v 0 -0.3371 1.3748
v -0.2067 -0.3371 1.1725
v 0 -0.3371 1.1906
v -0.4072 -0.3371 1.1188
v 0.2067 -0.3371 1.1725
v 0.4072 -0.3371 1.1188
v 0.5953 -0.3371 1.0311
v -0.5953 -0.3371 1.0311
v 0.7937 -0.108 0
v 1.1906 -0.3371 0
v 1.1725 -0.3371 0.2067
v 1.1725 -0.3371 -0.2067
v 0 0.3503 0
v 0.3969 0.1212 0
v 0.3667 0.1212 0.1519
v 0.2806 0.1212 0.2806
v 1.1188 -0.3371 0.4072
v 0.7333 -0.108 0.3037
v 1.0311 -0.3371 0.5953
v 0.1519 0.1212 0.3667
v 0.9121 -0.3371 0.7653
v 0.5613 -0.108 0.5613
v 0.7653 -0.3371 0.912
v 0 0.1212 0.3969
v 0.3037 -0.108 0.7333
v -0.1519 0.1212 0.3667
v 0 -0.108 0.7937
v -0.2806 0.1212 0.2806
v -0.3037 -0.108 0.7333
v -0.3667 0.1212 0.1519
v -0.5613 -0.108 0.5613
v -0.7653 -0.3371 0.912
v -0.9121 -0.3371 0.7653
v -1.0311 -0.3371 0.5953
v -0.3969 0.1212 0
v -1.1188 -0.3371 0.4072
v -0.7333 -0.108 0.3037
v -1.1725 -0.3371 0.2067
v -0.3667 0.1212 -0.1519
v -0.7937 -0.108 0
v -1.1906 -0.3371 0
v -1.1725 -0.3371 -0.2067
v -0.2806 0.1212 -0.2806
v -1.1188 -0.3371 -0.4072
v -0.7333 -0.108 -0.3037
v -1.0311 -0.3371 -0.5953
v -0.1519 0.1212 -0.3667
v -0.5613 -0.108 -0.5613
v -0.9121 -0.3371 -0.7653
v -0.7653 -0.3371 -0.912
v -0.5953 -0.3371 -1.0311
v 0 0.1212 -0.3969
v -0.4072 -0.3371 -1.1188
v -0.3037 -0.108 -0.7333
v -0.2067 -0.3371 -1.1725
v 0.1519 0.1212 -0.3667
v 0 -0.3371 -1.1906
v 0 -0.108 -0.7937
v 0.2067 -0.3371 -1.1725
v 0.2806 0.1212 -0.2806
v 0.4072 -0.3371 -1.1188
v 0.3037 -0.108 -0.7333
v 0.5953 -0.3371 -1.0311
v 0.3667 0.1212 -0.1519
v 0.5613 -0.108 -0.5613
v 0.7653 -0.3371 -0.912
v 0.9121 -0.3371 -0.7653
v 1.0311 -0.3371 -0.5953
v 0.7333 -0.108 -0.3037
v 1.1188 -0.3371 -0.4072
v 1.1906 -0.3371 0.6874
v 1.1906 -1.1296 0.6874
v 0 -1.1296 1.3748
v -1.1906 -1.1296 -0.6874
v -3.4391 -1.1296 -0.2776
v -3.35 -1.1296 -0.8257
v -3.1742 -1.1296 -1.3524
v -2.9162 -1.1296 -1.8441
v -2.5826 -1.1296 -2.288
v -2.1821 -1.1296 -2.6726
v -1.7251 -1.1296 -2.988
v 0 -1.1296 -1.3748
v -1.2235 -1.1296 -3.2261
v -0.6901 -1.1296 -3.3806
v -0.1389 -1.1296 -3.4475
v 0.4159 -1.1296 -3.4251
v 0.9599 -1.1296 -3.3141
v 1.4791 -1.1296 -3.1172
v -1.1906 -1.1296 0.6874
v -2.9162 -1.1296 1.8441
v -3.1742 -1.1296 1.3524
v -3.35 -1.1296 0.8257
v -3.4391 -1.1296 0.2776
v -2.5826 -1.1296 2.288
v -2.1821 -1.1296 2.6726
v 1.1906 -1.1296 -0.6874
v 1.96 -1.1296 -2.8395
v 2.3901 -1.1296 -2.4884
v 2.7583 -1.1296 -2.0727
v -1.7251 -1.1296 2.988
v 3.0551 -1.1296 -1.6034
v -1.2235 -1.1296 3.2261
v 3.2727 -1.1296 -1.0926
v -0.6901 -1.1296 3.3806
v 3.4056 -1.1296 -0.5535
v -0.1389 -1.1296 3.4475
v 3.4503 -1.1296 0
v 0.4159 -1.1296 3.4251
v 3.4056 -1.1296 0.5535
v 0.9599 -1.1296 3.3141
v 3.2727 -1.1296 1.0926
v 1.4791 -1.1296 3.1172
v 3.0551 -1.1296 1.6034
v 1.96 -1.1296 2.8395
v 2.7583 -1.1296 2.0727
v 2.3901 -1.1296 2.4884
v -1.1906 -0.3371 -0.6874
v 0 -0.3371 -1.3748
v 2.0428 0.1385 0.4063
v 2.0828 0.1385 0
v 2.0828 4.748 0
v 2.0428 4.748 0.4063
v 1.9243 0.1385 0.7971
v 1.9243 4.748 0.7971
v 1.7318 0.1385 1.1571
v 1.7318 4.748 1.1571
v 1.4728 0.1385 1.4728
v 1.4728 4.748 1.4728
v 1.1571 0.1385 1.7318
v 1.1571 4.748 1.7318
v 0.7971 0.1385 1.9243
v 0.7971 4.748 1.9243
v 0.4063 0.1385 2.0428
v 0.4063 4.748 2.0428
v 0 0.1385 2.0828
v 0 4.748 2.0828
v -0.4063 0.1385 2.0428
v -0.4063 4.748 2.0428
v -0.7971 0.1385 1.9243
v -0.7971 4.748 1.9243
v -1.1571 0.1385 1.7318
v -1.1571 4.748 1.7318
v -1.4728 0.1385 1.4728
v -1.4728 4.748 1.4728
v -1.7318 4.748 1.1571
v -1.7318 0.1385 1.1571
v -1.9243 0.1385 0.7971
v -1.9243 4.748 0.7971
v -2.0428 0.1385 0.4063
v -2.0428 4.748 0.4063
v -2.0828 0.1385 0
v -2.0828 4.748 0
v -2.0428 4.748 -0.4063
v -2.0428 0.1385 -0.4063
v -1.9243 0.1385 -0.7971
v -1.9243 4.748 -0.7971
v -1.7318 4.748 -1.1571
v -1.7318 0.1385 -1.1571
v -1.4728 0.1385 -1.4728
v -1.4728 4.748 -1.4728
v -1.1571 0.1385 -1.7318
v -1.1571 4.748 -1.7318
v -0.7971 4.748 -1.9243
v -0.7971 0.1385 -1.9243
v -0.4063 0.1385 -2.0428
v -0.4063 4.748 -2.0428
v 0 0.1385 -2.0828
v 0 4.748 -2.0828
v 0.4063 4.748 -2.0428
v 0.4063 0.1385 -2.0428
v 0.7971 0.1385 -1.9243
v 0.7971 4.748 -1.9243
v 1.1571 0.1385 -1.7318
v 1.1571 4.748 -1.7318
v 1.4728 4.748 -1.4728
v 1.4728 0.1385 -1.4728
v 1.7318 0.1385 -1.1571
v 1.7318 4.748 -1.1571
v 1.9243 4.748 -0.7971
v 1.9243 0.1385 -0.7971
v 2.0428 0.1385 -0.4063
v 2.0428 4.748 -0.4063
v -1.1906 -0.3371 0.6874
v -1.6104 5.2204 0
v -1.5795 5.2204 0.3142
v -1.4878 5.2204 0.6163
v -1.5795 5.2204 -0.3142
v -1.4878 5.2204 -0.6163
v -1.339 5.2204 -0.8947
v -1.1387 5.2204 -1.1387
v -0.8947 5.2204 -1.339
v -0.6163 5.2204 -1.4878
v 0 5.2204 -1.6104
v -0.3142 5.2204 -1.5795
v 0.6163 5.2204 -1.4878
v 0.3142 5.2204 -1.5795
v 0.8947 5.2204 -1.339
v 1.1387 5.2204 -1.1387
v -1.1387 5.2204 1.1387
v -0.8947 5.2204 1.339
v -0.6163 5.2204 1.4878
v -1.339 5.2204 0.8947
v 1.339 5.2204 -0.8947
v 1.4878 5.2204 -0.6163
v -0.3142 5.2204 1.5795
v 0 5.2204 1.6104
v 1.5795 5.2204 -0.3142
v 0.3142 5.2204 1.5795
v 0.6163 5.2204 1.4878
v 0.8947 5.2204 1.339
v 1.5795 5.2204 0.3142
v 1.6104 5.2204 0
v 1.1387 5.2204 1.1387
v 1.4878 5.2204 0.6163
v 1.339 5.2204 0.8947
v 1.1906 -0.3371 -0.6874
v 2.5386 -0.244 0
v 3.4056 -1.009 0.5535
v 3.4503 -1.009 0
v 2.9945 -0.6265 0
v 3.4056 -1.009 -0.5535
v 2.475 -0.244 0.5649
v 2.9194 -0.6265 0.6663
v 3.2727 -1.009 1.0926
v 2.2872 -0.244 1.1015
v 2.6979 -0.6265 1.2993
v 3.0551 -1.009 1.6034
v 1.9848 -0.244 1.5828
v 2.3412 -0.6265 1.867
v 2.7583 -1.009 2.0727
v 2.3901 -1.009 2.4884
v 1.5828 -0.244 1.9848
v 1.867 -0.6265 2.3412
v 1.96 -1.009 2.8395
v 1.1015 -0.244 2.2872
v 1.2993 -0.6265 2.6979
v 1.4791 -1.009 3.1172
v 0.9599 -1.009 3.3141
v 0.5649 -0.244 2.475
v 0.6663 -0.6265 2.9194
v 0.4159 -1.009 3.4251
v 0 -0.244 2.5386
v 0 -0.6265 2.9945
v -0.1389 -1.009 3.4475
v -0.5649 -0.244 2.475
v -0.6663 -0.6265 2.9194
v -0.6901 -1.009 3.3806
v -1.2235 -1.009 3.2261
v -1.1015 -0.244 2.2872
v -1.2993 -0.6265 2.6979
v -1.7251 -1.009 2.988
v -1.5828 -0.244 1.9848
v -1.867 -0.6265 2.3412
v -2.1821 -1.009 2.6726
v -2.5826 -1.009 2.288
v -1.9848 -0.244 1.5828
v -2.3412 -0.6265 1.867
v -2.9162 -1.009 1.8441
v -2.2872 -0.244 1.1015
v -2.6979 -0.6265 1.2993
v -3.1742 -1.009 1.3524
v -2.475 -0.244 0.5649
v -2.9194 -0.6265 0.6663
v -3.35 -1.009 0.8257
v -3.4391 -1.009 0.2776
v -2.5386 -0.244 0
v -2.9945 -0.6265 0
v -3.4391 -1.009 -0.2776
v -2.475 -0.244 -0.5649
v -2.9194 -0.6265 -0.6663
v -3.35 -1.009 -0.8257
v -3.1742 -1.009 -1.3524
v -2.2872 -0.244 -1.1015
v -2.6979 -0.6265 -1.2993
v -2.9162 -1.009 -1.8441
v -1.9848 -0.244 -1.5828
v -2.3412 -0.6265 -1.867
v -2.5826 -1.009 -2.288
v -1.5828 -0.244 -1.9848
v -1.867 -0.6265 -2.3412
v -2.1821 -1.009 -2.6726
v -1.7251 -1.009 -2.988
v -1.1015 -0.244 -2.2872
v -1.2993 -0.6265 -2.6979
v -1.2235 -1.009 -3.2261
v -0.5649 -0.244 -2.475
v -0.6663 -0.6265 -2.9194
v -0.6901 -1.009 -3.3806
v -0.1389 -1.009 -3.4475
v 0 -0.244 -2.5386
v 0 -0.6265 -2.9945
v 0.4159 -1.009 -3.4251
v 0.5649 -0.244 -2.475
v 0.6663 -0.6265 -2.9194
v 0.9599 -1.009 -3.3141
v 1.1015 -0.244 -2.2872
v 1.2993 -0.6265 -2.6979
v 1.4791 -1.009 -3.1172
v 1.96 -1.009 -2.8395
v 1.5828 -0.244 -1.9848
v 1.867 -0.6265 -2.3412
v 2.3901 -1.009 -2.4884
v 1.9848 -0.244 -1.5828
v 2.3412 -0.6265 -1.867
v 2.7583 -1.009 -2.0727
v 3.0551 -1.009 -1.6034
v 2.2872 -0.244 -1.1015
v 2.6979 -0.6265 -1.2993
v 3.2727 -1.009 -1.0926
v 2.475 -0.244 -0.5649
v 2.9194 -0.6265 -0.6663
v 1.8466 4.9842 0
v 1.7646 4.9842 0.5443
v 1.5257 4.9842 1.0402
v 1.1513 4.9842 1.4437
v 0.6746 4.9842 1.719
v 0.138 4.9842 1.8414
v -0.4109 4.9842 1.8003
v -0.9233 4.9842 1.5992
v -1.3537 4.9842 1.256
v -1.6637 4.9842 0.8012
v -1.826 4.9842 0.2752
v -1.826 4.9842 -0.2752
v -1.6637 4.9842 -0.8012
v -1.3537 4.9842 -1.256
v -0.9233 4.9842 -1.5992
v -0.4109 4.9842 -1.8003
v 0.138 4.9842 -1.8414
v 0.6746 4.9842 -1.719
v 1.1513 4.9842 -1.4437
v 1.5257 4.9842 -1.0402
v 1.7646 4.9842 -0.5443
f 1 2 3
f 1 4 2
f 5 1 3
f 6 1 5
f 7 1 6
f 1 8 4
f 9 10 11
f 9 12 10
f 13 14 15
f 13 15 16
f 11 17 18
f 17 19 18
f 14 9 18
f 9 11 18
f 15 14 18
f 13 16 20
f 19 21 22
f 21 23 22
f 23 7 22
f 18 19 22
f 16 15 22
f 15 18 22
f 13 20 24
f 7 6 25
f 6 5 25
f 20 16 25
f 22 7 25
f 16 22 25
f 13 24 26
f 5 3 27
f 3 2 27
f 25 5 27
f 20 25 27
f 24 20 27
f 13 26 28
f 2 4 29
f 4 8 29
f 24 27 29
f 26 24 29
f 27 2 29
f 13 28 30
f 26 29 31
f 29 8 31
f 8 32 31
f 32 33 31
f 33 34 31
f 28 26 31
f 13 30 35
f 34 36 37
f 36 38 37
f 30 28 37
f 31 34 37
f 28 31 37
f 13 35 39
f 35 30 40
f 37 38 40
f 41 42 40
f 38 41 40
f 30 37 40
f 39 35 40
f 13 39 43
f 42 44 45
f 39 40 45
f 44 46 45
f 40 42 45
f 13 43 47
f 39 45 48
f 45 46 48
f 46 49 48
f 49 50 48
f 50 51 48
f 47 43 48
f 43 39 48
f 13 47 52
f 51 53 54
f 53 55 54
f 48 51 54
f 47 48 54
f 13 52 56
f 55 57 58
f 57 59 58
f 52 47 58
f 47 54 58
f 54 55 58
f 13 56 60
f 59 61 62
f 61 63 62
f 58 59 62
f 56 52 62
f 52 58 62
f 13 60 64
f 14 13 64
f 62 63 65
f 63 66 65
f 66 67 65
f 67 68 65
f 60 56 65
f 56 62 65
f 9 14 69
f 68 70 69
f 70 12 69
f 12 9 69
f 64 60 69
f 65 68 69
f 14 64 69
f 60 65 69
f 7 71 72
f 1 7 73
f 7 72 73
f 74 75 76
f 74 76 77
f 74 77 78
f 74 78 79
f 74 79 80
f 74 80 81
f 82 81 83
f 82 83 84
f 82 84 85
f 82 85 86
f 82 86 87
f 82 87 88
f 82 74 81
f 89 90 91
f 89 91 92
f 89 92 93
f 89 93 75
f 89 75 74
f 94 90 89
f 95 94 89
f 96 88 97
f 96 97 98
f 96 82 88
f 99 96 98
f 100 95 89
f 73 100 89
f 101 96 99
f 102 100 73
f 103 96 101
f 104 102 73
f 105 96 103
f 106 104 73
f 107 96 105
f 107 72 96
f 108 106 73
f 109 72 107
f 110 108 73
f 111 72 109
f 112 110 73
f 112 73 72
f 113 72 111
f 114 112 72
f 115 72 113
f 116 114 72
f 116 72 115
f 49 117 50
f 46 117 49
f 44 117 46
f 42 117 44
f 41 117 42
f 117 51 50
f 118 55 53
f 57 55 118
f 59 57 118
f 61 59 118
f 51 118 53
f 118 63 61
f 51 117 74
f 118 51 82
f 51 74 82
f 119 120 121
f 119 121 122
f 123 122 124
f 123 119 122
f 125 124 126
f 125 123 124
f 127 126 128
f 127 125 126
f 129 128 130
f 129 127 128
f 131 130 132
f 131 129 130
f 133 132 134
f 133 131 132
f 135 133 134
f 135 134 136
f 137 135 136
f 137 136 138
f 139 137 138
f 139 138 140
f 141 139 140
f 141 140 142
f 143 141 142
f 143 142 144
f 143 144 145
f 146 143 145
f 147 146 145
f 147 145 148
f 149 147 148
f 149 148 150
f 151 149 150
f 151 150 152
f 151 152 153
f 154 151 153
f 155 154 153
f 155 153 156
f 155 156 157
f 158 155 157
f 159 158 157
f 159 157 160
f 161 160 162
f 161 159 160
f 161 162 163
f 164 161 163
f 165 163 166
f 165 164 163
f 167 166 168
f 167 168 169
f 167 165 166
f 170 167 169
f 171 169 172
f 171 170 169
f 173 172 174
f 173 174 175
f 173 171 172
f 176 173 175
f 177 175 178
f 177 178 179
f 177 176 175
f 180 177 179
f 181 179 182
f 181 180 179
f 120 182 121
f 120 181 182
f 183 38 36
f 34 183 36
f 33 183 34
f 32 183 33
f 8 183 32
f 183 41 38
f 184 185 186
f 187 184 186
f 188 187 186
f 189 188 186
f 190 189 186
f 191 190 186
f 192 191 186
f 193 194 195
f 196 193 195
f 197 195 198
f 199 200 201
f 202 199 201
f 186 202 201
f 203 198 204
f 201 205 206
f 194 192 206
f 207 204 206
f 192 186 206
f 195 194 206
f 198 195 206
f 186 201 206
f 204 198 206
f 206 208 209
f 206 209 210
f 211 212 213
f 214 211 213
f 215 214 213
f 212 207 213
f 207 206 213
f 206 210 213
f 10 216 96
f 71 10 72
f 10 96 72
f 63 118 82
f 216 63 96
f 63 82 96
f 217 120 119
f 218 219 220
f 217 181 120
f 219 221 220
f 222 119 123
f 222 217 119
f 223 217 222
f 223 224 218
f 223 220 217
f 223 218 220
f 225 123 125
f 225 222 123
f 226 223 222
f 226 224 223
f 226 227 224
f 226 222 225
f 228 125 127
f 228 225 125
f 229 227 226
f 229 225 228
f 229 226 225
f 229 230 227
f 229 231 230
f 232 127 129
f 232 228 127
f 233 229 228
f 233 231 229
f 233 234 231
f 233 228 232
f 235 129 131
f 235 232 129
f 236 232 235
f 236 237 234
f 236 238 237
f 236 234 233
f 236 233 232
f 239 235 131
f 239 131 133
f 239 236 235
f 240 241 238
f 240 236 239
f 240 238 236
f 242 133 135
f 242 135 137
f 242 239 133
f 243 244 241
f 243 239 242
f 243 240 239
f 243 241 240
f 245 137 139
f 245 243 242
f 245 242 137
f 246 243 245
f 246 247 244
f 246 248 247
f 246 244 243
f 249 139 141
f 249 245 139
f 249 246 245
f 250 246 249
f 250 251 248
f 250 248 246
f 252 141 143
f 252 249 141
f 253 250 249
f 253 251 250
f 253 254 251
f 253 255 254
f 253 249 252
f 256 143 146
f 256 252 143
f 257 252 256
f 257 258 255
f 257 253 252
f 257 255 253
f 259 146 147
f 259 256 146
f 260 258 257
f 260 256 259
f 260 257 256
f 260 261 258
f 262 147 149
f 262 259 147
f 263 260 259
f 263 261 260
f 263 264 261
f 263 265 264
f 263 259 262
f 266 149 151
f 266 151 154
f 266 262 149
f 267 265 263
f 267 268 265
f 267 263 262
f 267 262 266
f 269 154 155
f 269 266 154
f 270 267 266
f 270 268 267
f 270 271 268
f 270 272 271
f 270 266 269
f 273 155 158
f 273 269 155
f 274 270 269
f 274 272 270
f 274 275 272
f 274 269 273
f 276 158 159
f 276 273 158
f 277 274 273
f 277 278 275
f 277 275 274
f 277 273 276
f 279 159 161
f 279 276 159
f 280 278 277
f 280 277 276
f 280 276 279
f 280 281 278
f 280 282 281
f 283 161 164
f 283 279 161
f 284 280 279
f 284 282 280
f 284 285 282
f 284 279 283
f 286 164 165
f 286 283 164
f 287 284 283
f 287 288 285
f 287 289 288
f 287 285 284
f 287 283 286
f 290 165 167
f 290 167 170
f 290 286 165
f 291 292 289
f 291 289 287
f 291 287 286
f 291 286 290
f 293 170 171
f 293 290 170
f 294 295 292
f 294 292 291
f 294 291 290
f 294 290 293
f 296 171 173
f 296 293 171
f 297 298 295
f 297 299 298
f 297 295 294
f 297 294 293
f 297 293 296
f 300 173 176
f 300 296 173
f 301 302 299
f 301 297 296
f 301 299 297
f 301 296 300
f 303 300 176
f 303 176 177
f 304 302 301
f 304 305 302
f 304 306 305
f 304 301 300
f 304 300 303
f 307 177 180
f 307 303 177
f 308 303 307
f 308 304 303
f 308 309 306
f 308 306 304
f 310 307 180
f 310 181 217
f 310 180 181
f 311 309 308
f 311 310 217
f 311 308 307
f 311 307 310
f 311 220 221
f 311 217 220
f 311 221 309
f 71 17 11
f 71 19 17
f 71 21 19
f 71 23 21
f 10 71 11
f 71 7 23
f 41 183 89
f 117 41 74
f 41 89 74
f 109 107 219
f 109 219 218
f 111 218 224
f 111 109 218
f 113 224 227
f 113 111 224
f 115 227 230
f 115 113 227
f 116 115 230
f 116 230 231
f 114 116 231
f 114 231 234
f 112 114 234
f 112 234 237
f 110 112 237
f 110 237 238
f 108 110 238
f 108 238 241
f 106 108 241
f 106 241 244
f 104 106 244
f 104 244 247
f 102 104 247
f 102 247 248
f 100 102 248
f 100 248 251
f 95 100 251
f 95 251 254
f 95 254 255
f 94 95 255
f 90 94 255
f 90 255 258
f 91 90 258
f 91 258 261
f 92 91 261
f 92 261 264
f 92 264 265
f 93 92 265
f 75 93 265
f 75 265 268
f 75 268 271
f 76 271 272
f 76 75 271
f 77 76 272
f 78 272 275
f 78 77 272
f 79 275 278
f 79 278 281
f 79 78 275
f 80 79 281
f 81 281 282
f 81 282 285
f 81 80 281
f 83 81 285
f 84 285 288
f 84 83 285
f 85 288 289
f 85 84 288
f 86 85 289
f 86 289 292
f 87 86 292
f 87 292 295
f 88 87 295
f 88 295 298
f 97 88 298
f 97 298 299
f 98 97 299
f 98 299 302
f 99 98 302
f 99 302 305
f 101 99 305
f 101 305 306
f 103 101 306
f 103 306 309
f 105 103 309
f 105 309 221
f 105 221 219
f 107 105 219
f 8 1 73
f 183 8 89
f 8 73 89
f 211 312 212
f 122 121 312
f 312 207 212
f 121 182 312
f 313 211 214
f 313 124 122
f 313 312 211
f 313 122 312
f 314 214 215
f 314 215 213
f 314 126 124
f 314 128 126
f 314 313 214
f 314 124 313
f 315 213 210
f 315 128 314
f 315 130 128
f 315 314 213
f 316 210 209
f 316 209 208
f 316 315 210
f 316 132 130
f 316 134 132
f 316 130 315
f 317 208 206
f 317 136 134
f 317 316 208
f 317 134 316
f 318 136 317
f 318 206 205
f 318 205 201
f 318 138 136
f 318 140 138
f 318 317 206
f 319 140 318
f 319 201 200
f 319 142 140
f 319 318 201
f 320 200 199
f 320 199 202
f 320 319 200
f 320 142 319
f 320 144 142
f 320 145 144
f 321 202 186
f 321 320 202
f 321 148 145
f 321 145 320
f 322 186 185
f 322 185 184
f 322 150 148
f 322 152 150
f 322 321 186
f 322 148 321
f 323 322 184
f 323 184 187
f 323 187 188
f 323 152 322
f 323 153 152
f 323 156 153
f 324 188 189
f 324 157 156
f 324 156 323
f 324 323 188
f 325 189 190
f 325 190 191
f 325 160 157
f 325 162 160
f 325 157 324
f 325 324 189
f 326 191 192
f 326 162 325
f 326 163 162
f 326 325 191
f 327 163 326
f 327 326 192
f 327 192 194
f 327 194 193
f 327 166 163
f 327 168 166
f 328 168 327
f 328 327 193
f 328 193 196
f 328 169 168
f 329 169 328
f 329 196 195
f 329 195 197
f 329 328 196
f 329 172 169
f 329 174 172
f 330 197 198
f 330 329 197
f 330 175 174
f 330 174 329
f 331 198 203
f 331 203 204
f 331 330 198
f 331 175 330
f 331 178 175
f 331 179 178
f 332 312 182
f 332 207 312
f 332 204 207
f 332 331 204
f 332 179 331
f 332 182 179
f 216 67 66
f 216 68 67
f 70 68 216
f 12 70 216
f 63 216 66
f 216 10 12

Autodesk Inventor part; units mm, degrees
sketch "Sketch_1" plane through (0, 0, 0) normal (0, 0, 1) x (1, 0, 0)
  line L0 (0, -1.1296) -> (0, 5.2204)
  line L1 (0, 5.2204) -> (1.6104, 5.2204)
  line L2 (1.6104, 5.2204) -> (2.0828, 4.748)
  line L3 (2.0828, 4.748) -> (2.0828, 0.1385)
  line L4 (2.0828, 0.1385) -> (3.4503, -1.009)
  line L5 (3.4503, -1.009) -> (3.4503, -1.1296)
  line L6 (3.4503, -1.1296) -> (0, -1.1296)
  line L7 (0, -1.1296) -> (0, 5.2204)
revolve "Revolution1" add sketch "Sketch_1" angle 360 about axis through (0, -1.1296, 0) along (0, -1, 0)
thread "Thread1" size "8-32 UNC" class "2A" standard "ANSI Unified Screw Threads" length 3.7911
sketch "Sketch_2" plane through (0, -1.1296, 0) normal (0, -1, 0) x (1, 0, 0)
  line L0 (-1.1906, -0.6874) -> (0, -1.3748)
  line L1 (0, -1.3748) -> (1.1906, -0.6874)
  line L2 (1.1906, -0.6874) -> (1.1906, 0.6874)
  line L3 (1.1906, 0.6874) -> (0, 1.3748)
  line L4 (0, 1.3748) -> (-1.1906, 0.6874)
  line L5 (-1.1906, 0.6874) -> (-1.1906, -0.6874)
extrude "Extrusion1" cut sketch "Sketch_2" against normal blind 0.7925
sketch "Sketch_3" plane through (0, 0, 0) normal (0, 0, 1) x (1, 0, 0)
  line L0 (0, -0.3371) -> (0, 0.3503)
  line L1 (0, 0.3503) -> (1.1906, -0.3371)
  line L2 (1.1906, -0.3371) -> (0, -0.3371)
  line L3 (0, -0.3371) -> (0, 0.3503)
revolve "Revolution2" cut sketch "Sketch_3" angle 360 about axis through (0, -0.3371, 0) along (0, -1, 0)
ref_plane "screw_XY" through (0, 0, 0) normal (0, 1, 0) x (1, 0, 0)
ref_plane "screw_YZ" through (0, 0, 0) normal (1, 0, 0) x (0, 0, -1)
ref_plane "screw_ZX" through (0, 0, 0) normal (0, 0, -1) x (0, 1, 0)
properties part number "8-32_1"
